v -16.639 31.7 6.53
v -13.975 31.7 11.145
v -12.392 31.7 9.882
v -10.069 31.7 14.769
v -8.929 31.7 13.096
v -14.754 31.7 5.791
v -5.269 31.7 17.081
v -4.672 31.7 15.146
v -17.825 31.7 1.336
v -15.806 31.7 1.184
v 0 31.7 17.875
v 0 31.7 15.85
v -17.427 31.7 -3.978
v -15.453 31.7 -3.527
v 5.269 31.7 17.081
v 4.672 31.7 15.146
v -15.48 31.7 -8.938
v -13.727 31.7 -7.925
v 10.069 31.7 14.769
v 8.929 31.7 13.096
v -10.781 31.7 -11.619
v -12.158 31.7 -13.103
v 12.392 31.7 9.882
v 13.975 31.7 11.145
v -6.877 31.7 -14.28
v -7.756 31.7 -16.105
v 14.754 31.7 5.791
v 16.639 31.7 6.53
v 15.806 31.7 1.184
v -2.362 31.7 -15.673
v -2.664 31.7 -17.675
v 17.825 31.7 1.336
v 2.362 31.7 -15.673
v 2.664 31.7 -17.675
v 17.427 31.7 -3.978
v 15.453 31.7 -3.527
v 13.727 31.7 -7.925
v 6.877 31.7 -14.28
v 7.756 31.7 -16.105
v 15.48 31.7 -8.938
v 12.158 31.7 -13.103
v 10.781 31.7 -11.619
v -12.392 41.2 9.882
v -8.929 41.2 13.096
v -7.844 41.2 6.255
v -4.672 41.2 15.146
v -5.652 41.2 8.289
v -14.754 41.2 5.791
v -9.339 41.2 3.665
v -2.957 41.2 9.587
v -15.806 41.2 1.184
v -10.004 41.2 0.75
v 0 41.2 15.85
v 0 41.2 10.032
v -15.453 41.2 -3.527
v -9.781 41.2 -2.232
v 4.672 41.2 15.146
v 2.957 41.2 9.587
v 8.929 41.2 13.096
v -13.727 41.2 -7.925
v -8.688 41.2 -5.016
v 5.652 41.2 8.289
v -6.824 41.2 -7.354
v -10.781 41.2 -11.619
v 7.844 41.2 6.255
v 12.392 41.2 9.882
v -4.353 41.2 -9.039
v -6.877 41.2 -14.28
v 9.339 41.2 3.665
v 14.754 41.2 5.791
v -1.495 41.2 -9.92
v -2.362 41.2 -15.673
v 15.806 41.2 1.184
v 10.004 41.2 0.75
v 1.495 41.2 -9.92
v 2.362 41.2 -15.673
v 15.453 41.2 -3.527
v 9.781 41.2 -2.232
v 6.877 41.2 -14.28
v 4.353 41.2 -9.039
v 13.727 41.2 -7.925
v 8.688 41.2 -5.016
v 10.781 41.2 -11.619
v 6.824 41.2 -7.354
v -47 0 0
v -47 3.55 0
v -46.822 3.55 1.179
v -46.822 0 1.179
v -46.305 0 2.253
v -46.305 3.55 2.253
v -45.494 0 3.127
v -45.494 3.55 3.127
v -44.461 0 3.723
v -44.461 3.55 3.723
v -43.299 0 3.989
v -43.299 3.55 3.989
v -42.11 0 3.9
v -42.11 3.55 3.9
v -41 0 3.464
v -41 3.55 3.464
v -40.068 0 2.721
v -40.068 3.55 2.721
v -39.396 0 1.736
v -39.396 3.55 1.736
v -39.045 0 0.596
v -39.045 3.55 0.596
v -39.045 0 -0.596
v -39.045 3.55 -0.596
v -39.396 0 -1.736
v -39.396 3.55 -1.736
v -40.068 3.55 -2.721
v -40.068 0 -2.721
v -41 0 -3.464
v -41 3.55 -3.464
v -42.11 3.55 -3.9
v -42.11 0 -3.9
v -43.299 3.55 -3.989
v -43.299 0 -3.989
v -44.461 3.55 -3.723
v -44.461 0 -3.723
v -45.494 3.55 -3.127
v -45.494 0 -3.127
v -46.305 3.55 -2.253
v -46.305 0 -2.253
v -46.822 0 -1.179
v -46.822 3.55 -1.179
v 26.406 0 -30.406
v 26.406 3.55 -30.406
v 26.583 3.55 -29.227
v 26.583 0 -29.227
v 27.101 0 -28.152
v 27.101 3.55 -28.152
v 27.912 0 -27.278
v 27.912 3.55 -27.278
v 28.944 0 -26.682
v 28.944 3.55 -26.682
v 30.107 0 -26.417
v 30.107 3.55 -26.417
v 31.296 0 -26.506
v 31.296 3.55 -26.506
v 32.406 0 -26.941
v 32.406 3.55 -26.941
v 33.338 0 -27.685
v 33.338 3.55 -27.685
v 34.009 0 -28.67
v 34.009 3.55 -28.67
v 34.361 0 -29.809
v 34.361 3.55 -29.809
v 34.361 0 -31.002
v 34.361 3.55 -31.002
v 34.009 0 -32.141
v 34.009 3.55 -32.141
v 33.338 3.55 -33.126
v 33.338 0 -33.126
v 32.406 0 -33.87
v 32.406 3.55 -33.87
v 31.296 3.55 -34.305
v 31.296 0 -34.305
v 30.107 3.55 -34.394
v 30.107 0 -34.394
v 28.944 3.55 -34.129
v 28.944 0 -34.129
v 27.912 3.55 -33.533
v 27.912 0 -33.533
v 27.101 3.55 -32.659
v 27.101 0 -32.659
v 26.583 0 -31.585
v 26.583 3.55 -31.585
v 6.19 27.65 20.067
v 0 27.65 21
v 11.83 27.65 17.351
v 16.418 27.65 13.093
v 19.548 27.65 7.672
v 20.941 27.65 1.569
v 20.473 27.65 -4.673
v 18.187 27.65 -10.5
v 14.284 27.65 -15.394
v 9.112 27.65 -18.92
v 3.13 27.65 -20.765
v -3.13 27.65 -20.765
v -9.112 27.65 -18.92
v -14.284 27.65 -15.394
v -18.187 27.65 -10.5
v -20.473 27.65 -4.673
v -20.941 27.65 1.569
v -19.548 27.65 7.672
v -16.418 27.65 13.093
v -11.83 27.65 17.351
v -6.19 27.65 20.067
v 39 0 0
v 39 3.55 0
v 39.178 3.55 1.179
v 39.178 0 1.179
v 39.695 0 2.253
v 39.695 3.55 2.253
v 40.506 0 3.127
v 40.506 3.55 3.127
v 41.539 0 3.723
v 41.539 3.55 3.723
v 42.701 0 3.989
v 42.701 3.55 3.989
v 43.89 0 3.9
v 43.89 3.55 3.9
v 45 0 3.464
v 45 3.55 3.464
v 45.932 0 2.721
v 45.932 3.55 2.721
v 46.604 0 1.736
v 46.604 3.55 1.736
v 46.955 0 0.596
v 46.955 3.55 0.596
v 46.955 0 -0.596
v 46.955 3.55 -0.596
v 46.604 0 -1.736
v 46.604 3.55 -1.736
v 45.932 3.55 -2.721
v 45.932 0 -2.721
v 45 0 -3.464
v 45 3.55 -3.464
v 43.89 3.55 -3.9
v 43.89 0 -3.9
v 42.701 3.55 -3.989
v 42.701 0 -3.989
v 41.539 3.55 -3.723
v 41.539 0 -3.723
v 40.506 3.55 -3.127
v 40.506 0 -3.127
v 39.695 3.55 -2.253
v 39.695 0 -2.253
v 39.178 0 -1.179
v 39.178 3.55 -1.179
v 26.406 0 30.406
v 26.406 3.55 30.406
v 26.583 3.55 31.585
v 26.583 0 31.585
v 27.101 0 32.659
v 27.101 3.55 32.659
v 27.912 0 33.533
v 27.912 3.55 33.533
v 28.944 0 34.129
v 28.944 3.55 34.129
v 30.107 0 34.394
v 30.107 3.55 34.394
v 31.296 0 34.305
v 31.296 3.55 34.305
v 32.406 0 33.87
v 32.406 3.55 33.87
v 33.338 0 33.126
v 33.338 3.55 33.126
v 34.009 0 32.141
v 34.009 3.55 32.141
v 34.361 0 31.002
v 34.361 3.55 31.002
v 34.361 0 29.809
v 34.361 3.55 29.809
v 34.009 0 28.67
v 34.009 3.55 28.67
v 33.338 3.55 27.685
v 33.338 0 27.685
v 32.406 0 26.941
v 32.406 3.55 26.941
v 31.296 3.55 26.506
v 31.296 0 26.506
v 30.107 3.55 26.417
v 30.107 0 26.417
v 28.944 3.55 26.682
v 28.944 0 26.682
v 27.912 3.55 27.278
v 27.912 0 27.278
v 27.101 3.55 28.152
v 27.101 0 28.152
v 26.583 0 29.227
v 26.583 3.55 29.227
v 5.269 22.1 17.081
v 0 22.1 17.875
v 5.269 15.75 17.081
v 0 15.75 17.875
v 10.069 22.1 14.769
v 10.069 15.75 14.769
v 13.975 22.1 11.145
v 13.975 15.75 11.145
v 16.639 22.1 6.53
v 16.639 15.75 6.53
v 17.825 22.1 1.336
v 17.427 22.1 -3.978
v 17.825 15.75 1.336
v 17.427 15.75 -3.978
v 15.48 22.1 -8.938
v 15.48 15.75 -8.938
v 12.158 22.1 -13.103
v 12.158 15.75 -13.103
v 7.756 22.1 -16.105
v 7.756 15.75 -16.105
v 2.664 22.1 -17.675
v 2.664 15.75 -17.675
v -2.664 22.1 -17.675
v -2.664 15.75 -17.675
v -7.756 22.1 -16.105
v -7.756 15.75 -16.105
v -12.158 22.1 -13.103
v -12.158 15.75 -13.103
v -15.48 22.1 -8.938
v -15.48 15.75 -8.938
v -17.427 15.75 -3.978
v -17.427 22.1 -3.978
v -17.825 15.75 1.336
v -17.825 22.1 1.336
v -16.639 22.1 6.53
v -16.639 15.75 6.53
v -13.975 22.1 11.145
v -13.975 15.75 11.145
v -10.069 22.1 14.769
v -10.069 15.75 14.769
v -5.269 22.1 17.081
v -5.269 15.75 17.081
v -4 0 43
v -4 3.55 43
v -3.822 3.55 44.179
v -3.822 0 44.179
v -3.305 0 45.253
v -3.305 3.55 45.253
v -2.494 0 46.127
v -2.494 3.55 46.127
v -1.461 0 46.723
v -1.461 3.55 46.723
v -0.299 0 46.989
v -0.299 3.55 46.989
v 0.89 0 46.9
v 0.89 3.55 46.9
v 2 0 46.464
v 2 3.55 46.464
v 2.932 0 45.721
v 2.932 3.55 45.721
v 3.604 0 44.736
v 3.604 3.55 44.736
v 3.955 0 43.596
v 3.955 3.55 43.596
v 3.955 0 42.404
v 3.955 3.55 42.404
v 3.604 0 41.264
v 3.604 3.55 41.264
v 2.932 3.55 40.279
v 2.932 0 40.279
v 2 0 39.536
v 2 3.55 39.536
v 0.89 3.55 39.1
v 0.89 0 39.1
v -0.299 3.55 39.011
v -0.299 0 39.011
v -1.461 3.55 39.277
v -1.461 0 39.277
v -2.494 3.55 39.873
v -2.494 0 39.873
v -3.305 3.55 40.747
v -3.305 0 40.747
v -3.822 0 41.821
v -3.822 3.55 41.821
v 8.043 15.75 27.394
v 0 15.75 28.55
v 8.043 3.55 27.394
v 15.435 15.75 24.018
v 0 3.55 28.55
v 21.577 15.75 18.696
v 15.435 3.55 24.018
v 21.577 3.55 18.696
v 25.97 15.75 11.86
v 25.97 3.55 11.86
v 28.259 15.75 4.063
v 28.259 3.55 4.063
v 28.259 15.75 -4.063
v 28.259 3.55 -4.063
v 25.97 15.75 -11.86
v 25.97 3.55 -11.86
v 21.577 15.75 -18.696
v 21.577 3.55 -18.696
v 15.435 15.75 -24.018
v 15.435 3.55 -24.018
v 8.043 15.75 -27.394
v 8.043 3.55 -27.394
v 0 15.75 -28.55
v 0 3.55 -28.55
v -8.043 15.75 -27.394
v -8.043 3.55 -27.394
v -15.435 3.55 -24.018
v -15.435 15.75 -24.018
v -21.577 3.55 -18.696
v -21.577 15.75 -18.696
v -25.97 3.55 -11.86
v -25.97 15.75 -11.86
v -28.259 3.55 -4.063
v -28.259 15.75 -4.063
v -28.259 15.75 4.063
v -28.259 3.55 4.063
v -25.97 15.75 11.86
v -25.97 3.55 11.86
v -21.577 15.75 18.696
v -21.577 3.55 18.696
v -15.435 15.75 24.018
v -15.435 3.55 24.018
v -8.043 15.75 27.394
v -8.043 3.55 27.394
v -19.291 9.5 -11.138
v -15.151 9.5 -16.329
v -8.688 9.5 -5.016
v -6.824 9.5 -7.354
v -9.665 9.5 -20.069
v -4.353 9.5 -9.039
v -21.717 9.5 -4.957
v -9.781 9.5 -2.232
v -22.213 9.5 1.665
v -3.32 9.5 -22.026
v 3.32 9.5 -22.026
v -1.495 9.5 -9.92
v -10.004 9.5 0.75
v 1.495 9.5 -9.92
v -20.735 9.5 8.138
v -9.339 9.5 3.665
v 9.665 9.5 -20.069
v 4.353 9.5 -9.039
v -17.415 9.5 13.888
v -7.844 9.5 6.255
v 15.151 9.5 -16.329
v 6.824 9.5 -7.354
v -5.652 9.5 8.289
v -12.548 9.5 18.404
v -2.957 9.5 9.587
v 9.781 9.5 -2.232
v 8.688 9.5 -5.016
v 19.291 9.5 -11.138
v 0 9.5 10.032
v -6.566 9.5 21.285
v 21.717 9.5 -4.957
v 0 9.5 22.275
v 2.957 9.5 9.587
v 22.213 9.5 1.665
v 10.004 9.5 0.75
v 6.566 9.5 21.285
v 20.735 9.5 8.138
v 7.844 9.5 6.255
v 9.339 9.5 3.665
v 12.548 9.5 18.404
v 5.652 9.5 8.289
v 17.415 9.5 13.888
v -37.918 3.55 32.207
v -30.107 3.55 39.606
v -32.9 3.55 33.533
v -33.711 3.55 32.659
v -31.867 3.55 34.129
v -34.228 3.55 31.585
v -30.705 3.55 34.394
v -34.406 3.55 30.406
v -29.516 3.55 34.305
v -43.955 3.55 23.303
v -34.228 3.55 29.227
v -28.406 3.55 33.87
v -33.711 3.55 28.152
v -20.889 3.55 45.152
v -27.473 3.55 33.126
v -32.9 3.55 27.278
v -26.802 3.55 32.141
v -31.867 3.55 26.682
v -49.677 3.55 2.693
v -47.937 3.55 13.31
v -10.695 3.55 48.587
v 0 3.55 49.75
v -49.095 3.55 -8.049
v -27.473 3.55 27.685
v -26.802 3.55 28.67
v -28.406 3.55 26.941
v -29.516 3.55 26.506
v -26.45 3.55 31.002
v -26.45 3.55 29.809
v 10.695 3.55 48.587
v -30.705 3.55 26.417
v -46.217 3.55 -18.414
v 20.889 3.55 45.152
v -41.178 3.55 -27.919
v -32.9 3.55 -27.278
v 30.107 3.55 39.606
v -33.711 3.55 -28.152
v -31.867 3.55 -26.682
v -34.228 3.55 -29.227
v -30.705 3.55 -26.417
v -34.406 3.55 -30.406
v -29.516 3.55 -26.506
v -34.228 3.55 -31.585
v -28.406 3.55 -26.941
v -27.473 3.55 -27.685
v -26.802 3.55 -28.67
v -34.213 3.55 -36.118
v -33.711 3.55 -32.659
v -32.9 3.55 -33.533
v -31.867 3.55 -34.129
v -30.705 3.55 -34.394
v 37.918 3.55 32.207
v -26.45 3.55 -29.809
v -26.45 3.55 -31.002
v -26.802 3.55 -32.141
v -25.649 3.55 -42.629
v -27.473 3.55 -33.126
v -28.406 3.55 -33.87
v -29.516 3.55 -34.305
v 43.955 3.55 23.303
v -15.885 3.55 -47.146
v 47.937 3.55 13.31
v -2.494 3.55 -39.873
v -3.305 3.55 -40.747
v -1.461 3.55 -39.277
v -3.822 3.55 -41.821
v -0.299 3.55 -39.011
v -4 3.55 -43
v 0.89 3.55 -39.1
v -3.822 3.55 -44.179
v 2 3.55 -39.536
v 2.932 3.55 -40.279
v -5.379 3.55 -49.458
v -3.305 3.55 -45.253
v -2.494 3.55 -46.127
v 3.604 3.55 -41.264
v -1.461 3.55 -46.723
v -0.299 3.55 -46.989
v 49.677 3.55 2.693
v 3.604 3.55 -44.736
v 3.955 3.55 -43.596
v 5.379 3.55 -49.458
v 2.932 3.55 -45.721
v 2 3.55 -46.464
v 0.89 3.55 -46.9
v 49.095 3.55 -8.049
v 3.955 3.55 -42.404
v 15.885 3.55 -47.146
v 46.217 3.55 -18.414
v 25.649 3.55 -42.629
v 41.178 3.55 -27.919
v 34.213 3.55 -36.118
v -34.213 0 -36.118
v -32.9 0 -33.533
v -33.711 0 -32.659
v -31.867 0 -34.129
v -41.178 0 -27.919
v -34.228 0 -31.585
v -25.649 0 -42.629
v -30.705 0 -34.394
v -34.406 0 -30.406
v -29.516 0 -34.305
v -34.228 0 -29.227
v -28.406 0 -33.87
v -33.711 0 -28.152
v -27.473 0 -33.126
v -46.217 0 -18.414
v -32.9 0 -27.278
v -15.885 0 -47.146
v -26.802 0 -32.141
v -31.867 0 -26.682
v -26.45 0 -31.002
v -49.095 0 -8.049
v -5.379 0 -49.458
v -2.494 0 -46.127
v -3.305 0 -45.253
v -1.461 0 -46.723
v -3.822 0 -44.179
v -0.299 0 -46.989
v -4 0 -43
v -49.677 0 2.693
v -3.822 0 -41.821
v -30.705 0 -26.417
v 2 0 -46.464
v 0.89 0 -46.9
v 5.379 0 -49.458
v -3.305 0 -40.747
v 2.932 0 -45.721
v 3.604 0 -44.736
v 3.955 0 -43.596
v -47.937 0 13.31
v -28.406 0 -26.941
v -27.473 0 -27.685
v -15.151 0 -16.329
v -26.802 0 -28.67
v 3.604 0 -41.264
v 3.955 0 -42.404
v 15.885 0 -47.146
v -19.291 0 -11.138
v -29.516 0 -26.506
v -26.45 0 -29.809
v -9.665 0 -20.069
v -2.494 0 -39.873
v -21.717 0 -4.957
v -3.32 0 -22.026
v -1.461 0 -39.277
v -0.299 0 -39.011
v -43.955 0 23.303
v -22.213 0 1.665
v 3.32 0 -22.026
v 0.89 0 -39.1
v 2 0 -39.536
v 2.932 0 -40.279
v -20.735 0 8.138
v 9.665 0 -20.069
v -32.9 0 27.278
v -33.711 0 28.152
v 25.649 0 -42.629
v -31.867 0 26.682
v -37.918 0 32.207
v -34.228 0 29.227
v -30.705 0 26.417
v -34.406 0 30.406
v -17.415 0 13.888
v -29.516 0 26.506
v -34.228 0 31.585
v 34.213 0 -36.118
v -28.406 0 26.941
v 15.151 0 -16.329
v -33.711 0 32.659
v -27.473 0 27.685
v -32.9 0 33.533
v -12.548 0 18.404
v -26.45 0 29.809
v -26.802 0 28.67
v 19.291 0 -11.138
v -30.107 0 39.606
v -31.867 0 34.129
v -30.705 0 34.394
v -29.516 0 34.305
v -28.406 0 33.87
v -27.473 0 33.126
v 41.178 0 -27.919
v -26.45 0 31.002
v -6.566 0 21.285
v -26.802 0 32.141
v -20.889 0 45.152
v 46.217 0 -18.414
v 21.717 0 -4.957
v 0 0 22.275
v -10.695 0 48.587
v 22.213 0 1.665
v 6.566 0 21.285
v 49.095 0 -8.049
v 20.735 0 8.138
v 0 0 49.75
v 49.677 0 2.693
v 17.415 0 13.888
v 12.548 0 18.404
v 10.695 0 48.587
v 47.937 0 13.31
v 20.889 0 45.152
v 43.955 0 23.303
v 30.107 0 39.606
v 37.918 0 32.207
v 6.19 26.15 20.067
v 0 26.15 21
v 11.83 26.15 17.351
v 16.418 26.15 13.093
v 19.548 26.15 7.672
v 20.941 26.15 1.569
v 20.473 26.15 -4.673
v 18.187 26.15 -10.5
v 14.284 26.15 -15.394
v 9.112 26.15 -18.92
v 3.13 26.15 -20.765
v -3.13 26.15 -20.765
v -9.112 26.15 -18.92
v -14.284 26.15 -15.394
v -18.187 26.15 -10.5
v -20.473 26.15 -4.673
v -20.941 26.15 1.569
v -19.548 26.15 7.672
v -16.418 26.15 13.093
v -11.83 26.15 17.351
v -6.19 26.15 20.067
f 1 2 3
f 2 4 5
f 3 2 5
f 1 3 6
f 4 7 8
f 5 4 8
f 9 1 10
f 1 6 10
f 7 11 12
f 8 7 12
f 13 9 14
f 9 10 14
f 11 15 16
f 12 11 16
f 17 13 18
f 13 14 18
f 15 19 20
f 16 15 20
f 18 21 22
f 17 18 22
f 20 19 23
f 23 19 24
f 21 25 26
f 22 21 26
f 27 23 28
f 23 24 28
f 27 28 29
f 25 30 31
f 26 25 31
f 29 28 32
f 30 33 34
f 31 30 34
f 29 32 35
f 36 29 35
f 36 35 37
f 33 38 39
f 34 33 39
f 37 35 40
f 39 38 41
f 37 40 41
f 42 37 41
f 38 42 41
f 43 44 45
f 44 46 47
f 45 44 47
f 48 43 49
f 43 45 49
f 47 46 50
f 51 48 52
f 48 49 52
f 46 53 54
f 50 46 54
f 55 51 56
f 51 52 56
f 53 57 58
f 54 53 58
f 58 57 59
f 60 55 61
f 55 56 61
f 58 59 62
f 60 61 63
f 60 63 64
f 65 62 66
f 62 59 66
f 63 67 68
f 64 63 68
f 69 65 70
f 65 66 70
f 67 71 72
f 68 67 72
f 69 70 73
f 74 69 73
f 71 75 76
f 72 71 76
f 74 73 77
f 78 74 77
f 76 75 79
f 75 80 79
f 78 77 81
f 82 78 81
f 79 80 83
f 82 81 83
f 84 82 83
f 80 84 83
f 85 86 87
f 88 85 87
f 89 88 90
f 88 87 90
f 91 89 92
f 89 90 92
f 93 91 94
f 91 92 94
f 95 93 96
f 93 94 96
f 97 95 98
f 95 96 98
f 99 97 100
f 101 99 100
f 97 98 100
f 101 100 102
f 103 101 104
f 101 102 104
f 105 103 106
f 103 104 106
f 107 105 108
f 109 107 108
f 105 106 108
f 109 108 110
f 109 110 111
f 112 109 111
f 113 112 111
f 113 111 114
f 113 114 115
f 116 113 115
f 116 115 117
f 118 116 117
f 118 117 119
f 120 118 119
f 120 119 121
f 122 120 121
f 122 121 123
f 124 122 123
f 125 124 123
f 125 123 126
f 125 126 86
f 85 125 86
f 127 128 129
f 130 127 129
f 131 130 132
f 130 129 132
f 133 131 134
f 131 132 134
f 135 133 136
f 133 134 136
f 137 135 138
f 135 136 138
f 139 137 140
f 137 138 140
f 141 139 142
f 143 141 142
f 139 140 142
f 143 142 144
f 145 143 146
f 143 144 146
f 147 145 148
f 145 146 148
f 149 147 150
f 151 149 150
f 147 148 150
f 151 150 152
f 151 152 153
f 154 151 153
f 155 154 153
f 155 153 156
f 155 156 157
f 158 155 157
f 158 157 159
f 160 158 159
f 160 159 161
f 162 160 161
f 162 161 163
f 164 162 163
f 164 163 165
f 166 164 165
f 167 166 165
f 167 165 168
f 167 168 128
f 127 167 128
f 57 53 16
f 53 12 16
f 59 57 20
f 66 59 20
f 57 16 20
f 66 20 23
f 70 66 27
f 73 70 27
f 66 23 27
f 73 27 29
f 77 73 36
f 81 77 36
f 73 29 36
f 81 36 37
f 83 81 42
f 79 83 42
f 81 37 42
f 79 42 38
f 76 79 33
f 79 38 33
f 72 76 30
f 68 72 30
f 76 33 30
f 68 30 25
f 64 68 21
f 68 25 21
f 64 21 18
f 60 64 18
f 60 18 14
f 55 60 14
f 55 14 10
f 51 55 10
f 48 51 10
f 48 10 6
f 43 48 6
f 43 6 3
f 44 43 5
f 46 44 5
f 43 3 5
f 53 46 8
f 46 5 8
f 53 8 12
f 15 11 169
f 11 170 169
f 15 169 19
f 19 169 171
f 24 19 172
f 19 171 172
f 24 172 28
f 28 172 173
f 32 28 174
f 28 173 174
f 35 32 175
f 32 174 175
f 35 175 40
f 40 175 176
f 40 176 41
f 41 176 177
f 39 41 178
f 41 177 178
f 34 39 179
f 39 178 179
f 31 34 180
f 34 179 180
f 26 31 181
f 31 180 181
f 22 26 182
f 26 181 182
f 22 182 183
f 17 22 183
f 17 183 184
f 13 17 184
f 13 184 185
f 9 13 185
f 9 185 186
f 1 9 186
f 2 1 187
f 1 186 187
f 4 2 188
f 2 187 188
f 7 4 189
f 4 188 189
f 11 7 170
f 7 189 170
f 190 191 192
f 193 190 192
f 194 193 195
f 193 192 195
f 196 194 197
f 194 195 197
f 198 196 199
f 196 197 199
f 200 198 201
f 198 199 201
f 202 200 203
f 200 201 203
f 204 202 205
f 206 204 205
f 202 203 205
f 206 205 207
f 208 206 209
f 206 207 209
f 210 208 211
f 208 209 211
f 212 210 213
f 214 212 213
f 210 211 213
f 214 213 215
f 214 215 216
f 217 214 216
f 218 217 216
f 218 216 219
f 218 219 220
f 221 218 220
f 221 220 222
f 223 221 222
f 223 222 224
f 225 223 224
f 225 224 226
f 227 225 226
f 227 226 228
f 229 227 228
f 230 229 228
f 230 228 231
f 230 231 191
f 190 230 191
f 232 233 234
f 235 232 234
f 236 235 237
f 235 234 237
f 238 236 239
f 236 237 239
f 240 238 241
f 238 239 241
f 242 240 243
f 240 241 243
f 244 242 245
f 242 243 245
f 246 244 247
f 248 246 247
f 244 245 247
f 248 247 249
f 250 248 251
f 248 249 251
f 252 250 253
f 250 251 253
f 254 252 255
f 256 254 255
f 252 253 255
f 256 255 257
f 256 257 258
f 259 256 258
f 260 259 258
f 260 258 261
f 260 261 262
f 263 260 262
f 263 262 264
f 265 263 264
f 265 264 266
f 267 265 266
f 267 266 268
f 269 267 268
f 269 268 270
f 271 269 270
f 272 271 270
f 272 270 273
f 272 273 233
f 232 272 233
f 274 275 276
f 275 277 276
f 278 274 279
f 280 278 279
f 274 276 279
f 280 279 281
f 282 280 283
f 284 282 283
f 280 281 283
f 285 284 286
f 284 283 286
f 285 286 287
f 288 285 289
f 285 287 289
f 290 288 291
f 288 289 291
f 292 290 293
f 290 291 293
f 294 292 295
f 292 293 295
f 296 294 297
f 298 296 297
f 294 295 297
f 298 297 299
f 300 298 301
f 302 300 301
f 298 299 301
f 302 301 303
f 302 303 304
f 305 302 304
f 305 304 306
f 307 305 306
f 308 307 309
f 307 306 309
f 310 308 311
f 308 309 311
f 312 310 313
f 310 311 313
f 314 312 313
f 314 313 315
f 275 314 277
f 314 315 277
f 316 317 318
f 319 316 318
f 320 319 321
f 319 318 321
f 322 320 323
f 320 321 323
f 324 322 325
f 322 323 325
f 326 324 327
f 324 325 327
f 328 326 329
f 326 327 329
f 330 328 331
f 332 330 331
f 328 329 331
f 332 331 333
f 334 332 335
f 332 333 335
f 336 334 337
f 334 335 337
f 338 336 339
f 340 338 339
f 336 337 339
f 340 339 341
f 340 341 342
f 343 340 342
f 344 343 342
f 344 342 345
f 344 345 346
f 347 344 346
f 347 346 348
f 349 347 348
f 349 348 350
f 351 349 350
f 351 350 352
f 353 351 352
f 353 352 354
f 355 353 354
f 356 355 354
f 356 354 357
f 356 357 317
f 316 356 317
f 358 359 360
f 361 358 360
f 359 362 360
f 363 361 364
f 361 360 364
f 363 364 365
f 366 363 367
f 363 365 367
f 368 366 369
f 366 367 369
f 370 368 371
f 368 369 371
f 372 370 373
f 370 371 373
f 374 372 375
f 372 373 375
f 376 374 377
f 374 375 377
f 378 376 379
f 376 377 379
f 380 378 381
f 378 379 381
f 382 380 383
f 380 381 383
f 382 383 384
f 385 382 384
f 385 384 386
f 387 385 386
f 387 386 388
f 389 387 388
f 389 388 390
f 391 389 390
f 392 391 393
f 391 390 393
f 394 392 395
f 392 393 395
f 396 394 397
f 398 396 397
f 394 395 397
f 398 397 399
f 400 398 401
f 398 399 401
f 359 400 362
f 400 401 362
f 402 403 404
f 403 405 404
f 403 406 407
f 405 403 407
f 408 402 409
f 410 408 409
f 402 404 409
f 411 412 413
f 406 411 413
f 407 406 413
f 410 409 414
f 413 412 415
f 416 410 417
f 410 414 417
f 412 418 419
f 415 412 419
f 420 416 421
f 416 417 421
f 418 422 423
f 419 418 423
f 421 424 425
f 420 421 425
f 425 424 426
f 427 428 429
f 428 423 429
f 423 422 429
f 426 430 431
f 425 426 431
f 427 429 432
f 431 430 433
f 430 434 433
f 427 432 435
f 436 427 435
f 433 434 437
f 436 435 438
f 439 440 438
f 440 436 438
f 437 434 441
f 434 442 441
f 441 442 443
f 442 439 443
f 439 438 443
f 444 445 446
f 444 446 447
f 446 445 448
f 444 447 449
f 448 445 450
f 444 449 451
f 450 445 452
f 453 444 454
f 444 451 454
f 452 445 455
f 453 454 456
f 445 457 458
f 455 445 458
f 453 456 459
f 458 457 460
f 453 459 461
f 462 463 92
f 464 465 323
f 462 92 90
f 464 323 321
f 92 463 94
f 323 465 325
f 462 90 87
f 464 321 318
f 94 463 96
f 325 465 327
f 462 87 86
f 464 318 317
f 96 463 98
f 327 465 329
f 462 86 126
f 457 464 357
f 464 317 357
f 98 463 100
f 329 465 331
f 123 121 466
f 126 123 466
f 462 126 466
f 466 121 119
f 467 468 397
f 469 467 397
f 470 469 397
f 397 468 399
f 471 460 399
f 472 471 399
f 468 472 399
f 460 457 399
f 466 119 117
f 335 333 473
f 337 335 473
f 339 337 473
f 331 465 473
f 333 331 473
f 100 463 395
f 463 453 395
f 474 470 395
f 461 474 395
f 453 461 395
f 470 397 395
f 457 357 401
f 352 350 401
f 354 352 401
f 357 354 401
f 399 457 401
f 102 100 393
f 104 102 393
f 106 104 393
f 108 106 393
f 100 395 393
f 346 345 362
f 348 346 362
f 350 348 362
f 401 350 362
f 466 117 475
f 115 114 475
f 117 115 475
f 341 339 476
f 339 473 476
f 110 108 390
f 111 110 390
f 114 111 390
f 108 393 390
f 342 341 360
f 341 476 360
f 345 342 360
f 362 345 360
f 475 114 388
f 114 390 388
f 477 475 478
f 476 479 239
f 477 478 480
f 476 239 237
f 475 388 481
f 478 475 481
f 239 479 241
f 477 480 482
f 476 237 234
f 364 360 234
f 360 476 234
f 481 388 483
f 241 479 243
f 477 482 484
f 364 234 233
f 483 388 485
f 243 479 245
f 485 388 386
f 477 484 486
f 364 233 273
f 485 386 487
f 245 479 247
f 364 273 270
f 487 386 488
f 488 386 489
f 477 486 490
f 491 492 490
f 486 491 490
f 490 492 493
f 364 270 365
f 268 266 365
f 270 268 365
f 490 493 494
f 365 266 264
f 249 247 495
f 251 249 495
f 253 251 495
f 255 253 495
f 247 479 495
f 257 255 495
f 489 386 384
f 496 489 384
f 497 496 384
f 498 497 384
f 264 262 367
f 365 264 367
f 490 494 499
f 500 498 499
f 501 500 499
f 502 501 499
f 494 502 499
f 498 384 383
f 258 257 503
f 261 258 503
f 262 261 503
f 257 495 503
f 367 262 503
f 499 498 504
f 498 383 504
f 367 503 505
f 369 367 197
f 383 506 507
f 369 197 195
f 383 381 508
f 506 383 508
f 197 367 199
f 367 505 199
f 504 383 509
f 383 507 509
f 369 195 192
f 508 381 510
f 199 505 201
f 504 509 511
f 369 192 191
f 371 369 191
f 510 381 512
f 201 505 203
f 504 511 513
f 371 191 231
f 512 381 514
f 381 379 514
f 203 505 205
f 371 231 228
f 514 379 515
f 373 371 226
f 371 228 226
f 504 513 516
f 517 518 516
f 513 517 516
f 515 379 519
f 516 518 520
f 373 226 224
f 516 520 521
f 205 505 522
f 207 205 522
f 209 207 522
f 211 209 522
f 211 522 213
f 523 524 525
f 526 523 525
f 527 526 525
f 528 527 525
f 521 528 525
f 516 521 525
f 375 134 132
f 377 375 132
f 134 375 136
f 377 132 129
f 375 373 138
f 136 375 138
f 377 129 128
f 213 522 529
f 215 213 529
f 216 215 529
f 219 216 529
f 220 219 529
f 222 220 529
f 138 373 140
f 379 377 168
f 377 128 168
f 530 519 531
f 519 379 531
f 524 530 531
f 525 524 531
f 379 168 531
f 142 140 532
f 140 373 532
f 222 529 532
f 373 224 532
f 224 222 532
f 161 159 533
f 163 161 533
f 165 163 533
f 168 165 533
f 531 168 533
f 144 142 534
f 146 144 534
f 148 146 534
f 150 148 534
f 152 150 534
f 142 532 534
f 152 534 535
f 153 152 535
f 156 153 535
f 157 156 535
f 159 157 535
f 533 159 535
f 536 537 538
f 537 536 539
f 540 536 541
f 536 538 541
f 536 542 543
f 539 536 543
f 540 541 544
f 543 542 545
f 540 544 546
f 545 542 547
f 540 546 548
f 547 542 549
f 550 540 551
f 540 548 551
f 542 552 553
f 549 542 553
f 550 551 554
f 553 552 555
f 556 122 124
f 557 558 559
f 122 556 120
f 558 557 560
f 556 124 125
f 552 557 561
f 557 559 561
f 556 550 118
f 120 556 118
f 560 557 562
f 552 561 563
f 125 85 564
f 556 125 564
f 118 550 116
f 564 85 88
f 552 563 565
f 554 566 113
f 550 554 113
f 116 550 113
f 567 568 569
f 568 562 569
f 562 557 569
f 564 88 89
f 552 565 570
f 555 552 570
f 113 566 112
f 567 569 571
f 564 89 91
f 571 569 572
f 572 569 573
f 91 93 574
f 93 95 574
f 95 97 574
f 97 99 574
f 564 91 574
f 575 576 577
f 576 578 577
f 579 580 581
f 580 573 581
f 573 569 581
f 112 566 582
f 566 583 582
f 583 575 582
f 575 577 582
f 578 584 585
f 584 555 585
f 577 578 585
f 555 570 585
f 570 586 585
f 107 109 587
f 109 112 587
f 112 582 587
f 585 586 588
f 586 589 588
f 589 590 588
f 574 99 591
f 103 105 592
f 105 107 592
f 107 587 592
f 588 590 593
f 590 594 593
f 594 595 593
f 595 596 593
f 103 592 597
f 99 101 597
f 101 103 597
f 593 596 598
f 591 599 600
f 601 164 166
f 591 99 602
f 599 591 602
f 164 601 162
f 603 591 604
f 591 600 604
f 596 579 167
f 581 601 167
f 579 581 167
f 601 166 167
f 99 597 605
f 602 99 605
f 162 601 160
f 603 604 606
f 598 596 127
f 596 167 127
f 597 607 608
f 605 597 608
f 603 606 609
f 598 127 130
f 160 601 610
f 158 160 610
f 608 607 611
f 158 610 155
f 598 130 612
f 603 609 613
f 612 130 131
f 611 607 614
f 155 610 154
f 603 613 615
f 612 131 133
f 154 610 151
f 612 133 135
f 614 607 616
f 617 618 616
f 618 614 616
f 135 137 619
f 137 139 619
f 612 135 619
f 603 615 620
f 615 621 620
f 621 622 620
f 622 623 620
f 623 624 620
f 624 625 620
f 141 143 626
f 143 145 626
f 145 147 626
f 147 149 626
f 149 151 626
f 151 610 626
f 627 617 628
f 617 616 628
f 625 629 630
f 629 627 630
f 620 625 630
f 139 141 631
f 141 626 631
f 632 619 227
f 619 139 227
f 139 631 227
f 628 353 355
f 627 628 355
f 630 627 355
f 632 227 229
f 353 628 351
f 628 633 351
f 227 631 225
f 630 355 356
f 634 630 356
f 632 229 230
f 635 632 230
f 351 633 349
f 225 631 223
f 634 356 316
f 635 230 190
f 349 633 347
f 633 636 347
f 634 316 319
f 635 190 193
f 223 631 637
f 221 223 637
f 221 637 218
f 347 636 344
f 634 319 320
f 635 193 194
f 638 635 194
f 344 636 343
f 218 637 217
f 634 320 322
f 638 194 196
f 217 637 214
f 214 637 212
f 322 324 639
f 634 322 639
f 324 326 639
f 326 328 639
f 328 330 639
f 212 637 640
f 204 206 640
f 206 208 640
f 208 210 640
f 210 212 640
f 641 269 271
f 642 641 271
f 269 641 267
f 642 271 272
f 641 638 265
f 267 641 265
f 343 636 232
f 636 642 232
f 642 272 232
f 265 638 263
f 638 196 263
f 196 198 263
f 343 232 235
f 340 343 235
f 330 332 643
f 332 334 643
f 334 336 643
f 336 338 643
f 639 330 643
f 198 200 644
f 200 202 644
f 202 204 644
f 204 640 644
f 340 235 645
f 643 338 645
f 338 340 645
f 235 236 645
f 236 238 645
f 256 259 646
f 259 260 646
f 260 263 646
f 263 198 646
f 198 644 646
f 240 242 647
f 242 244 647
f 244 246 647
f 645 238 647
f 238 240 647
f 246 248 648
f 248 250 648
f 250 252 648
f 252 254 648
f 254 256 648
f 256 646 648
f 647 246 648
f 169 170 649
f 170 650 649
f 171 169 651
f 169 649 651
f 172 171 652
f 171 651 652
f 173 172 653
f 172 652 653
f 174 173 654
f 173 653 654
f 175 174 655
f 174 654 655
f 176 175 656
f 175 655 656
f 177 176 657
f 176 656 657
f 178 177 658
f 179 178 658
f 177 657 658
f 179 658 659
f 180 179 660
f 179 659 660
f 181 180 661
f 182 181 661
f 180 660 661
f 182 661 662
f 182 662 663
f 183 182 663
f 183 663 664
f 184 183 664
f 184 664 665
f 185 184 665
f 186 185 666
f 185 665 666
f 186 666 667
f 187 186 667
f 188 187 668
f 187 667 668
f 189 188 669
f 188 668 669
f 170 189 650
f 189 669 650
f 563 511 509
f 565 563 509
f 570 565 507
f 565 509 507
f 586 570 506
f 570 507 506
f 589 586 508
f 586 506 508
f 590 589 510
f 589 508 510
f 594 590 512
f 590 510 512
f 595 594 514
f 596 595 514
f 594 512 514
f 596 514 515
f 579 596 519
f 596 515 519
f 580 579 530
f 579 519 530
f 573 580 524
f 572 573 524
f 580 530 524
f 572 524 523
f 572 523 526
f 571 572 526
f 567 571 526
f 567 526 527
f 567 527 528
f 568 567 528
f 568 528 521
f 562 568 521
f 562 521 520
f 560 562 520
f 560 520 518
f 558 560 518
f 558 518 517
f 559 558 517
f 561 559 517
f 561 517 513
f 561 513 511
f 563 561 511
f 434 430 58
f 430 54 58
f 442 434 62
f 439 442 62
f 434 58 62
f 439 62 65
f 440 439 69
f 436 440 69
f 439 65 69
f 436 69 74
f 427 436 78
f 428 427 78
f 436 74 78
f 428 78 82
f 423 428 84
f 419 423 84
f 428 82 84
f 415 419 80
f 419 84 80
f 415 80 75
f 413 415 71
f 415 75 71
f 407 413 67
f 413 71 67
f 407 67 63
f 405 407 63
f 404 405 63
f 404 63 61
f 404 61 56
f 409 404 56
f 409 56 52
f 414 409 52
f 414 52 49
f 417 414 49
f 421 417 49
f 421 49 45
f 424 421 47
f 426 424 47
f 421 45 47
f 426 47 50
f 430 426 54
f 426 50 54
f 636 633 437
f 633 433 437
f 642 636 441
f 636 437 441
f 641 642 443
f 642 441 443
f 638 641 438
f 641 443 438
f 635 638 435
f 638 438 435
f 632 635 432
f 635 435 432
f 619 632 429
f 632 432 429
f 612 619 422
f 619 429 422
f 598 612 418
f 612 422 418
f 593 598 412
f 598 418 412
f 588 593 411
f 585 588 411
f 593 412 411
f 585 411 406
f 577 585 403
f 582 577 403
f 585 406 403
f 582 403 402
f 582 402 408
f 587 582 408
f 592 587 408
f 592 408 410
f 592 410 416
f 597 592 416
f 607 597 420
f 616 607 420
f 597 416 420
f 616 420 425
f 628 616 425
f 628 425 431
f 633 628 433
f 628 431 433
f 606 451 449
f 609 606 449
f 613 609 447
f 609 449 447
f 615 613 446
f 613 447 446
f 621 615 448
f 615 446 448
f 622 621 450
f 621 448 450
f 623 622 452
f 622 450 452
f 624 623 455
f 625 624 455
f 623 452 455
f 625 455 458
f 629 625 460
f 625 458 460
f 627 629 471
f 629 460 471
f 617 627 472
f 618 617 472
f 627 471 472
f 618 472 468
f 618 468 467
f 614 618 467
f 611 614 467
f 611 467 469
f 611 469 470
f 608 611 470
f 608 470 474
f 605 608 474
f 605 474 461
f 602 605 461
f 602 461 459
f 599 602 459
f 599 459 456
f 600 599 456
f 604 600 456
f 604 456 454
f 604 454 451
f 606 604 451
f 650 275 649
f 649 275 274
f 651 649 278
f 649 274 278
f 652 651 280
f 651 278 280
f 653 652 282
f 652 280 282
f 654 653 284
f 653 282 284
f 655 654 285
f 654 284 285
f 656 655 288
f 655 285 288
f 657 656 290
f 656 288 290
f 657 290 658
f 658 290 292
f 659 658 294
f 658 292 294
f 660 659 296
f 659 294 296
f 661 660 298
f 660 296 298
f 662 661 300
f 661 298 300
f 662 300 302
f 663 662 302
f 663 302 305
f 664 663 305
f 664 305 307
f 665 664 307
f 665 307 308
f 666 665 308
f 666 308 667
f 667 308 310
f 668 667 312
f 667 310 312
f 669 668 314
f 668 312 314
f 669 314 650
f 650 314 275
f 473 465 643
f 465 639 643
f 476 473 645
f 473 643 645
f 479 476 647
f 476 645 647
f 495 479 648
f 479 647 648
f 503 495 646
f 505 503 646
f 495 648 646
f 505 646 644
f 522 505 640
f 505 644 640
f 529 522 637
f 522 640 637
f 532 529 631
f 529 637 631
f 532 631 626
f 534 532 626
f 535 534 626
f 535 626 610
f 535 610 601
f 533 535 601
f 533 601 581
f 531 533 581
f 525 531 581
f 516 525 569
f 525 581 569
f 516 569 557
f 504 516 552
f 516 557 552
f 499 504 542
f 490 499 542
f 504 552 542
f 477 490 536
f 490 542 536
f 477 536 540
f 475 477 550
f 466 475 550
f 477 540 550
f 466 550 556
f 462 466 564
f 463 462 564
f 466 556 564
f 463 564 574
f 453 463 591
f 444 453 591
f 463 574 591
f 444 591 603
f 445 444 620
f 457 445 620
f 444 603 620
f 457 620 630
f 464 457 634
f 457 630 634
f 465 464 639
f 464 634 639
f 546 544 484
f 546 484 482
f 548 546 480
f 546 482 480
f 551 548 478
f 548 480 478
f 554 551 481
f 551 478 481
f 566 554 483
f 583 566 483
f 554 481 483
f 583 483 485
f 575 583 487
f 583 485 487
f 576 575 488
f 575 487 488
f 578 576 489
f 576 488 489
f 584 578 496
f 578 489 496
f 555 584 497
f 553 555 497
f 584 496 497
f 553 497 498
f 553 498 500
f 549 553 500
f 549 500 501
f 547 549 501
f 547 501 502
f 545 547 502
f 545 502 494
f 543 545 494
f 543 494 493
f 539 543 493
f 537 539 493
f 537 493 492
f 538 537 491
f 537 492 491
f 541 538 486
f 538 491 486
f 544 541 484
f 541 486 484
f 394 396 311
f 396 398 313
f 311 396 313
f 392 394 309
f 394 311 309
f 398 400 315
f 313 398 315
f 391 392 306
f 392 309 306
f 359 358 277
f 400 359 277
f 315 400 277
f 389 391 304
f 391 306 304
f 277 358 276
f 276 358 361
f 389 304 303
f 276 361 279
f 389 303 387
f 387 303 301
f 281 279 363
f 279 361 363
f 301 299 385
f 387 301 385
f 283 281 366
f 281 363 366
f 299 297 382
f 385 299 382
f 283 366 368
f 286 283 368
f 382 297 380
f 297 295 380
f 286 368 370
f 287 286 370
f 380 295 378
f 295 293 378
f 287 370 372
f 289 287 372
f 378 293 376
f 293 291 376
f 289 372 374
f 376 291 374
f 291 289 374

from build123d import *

# Parameters (mm, degrees)
F2_R     = 4
F3_DEPTH = 254


with BuildPart() as f1:
    # F0 (on Right) → F1 (revolve)
    with BuildSketch(Plane.YZ):
        Polygon((0, 49.75), (0, 22.275), (9.5, 22.275), (9.5, 10.0325), (41.2, 10.0325), (41.2, 15.85), (31.7, 15.85), (31.7, 17.875), (27.65, 21), (26.15, 21), (22.1, 17.875), (15.75, 17.875), (15.75, 28.55), (3.55, 28.55), (3.55, 49.75), align=None)
    revolve(axis=Axis((0, 2500.943971, 0), (0, 1, 0)))

    # F2 (on face) → F3 (cut, symmetric)
    with BuildSketch(Plane(origin=(0, 3.55, 0), x_dir=(-1, 0, 0), z_dir=(0, 1, 0))):
        with Locations((0, 43)):
            Circle(F2_R)
        with Locations((-30.405592, 30.405592)):
            Circle(F2_R)
        with Locations((43, 0)):
            Circle(F2_R)
        with Locations((30.405592, 30.405592)):
            Circle(F2_R)
        with Locations((-30.405592, -30.405592)):
            Circle(F2_R)
        with Locations((-43, 0)):
            Circle(F2_R)
        with Locations((0, -43)):
            Circle(F2_R)
        with Locations((30.405592, -30.405592)):
            Circle(F2_R)
    extrude(amount=F3_DEPTH, both=True, mode=Mode.SUBTRACT)


solid = f1.part
